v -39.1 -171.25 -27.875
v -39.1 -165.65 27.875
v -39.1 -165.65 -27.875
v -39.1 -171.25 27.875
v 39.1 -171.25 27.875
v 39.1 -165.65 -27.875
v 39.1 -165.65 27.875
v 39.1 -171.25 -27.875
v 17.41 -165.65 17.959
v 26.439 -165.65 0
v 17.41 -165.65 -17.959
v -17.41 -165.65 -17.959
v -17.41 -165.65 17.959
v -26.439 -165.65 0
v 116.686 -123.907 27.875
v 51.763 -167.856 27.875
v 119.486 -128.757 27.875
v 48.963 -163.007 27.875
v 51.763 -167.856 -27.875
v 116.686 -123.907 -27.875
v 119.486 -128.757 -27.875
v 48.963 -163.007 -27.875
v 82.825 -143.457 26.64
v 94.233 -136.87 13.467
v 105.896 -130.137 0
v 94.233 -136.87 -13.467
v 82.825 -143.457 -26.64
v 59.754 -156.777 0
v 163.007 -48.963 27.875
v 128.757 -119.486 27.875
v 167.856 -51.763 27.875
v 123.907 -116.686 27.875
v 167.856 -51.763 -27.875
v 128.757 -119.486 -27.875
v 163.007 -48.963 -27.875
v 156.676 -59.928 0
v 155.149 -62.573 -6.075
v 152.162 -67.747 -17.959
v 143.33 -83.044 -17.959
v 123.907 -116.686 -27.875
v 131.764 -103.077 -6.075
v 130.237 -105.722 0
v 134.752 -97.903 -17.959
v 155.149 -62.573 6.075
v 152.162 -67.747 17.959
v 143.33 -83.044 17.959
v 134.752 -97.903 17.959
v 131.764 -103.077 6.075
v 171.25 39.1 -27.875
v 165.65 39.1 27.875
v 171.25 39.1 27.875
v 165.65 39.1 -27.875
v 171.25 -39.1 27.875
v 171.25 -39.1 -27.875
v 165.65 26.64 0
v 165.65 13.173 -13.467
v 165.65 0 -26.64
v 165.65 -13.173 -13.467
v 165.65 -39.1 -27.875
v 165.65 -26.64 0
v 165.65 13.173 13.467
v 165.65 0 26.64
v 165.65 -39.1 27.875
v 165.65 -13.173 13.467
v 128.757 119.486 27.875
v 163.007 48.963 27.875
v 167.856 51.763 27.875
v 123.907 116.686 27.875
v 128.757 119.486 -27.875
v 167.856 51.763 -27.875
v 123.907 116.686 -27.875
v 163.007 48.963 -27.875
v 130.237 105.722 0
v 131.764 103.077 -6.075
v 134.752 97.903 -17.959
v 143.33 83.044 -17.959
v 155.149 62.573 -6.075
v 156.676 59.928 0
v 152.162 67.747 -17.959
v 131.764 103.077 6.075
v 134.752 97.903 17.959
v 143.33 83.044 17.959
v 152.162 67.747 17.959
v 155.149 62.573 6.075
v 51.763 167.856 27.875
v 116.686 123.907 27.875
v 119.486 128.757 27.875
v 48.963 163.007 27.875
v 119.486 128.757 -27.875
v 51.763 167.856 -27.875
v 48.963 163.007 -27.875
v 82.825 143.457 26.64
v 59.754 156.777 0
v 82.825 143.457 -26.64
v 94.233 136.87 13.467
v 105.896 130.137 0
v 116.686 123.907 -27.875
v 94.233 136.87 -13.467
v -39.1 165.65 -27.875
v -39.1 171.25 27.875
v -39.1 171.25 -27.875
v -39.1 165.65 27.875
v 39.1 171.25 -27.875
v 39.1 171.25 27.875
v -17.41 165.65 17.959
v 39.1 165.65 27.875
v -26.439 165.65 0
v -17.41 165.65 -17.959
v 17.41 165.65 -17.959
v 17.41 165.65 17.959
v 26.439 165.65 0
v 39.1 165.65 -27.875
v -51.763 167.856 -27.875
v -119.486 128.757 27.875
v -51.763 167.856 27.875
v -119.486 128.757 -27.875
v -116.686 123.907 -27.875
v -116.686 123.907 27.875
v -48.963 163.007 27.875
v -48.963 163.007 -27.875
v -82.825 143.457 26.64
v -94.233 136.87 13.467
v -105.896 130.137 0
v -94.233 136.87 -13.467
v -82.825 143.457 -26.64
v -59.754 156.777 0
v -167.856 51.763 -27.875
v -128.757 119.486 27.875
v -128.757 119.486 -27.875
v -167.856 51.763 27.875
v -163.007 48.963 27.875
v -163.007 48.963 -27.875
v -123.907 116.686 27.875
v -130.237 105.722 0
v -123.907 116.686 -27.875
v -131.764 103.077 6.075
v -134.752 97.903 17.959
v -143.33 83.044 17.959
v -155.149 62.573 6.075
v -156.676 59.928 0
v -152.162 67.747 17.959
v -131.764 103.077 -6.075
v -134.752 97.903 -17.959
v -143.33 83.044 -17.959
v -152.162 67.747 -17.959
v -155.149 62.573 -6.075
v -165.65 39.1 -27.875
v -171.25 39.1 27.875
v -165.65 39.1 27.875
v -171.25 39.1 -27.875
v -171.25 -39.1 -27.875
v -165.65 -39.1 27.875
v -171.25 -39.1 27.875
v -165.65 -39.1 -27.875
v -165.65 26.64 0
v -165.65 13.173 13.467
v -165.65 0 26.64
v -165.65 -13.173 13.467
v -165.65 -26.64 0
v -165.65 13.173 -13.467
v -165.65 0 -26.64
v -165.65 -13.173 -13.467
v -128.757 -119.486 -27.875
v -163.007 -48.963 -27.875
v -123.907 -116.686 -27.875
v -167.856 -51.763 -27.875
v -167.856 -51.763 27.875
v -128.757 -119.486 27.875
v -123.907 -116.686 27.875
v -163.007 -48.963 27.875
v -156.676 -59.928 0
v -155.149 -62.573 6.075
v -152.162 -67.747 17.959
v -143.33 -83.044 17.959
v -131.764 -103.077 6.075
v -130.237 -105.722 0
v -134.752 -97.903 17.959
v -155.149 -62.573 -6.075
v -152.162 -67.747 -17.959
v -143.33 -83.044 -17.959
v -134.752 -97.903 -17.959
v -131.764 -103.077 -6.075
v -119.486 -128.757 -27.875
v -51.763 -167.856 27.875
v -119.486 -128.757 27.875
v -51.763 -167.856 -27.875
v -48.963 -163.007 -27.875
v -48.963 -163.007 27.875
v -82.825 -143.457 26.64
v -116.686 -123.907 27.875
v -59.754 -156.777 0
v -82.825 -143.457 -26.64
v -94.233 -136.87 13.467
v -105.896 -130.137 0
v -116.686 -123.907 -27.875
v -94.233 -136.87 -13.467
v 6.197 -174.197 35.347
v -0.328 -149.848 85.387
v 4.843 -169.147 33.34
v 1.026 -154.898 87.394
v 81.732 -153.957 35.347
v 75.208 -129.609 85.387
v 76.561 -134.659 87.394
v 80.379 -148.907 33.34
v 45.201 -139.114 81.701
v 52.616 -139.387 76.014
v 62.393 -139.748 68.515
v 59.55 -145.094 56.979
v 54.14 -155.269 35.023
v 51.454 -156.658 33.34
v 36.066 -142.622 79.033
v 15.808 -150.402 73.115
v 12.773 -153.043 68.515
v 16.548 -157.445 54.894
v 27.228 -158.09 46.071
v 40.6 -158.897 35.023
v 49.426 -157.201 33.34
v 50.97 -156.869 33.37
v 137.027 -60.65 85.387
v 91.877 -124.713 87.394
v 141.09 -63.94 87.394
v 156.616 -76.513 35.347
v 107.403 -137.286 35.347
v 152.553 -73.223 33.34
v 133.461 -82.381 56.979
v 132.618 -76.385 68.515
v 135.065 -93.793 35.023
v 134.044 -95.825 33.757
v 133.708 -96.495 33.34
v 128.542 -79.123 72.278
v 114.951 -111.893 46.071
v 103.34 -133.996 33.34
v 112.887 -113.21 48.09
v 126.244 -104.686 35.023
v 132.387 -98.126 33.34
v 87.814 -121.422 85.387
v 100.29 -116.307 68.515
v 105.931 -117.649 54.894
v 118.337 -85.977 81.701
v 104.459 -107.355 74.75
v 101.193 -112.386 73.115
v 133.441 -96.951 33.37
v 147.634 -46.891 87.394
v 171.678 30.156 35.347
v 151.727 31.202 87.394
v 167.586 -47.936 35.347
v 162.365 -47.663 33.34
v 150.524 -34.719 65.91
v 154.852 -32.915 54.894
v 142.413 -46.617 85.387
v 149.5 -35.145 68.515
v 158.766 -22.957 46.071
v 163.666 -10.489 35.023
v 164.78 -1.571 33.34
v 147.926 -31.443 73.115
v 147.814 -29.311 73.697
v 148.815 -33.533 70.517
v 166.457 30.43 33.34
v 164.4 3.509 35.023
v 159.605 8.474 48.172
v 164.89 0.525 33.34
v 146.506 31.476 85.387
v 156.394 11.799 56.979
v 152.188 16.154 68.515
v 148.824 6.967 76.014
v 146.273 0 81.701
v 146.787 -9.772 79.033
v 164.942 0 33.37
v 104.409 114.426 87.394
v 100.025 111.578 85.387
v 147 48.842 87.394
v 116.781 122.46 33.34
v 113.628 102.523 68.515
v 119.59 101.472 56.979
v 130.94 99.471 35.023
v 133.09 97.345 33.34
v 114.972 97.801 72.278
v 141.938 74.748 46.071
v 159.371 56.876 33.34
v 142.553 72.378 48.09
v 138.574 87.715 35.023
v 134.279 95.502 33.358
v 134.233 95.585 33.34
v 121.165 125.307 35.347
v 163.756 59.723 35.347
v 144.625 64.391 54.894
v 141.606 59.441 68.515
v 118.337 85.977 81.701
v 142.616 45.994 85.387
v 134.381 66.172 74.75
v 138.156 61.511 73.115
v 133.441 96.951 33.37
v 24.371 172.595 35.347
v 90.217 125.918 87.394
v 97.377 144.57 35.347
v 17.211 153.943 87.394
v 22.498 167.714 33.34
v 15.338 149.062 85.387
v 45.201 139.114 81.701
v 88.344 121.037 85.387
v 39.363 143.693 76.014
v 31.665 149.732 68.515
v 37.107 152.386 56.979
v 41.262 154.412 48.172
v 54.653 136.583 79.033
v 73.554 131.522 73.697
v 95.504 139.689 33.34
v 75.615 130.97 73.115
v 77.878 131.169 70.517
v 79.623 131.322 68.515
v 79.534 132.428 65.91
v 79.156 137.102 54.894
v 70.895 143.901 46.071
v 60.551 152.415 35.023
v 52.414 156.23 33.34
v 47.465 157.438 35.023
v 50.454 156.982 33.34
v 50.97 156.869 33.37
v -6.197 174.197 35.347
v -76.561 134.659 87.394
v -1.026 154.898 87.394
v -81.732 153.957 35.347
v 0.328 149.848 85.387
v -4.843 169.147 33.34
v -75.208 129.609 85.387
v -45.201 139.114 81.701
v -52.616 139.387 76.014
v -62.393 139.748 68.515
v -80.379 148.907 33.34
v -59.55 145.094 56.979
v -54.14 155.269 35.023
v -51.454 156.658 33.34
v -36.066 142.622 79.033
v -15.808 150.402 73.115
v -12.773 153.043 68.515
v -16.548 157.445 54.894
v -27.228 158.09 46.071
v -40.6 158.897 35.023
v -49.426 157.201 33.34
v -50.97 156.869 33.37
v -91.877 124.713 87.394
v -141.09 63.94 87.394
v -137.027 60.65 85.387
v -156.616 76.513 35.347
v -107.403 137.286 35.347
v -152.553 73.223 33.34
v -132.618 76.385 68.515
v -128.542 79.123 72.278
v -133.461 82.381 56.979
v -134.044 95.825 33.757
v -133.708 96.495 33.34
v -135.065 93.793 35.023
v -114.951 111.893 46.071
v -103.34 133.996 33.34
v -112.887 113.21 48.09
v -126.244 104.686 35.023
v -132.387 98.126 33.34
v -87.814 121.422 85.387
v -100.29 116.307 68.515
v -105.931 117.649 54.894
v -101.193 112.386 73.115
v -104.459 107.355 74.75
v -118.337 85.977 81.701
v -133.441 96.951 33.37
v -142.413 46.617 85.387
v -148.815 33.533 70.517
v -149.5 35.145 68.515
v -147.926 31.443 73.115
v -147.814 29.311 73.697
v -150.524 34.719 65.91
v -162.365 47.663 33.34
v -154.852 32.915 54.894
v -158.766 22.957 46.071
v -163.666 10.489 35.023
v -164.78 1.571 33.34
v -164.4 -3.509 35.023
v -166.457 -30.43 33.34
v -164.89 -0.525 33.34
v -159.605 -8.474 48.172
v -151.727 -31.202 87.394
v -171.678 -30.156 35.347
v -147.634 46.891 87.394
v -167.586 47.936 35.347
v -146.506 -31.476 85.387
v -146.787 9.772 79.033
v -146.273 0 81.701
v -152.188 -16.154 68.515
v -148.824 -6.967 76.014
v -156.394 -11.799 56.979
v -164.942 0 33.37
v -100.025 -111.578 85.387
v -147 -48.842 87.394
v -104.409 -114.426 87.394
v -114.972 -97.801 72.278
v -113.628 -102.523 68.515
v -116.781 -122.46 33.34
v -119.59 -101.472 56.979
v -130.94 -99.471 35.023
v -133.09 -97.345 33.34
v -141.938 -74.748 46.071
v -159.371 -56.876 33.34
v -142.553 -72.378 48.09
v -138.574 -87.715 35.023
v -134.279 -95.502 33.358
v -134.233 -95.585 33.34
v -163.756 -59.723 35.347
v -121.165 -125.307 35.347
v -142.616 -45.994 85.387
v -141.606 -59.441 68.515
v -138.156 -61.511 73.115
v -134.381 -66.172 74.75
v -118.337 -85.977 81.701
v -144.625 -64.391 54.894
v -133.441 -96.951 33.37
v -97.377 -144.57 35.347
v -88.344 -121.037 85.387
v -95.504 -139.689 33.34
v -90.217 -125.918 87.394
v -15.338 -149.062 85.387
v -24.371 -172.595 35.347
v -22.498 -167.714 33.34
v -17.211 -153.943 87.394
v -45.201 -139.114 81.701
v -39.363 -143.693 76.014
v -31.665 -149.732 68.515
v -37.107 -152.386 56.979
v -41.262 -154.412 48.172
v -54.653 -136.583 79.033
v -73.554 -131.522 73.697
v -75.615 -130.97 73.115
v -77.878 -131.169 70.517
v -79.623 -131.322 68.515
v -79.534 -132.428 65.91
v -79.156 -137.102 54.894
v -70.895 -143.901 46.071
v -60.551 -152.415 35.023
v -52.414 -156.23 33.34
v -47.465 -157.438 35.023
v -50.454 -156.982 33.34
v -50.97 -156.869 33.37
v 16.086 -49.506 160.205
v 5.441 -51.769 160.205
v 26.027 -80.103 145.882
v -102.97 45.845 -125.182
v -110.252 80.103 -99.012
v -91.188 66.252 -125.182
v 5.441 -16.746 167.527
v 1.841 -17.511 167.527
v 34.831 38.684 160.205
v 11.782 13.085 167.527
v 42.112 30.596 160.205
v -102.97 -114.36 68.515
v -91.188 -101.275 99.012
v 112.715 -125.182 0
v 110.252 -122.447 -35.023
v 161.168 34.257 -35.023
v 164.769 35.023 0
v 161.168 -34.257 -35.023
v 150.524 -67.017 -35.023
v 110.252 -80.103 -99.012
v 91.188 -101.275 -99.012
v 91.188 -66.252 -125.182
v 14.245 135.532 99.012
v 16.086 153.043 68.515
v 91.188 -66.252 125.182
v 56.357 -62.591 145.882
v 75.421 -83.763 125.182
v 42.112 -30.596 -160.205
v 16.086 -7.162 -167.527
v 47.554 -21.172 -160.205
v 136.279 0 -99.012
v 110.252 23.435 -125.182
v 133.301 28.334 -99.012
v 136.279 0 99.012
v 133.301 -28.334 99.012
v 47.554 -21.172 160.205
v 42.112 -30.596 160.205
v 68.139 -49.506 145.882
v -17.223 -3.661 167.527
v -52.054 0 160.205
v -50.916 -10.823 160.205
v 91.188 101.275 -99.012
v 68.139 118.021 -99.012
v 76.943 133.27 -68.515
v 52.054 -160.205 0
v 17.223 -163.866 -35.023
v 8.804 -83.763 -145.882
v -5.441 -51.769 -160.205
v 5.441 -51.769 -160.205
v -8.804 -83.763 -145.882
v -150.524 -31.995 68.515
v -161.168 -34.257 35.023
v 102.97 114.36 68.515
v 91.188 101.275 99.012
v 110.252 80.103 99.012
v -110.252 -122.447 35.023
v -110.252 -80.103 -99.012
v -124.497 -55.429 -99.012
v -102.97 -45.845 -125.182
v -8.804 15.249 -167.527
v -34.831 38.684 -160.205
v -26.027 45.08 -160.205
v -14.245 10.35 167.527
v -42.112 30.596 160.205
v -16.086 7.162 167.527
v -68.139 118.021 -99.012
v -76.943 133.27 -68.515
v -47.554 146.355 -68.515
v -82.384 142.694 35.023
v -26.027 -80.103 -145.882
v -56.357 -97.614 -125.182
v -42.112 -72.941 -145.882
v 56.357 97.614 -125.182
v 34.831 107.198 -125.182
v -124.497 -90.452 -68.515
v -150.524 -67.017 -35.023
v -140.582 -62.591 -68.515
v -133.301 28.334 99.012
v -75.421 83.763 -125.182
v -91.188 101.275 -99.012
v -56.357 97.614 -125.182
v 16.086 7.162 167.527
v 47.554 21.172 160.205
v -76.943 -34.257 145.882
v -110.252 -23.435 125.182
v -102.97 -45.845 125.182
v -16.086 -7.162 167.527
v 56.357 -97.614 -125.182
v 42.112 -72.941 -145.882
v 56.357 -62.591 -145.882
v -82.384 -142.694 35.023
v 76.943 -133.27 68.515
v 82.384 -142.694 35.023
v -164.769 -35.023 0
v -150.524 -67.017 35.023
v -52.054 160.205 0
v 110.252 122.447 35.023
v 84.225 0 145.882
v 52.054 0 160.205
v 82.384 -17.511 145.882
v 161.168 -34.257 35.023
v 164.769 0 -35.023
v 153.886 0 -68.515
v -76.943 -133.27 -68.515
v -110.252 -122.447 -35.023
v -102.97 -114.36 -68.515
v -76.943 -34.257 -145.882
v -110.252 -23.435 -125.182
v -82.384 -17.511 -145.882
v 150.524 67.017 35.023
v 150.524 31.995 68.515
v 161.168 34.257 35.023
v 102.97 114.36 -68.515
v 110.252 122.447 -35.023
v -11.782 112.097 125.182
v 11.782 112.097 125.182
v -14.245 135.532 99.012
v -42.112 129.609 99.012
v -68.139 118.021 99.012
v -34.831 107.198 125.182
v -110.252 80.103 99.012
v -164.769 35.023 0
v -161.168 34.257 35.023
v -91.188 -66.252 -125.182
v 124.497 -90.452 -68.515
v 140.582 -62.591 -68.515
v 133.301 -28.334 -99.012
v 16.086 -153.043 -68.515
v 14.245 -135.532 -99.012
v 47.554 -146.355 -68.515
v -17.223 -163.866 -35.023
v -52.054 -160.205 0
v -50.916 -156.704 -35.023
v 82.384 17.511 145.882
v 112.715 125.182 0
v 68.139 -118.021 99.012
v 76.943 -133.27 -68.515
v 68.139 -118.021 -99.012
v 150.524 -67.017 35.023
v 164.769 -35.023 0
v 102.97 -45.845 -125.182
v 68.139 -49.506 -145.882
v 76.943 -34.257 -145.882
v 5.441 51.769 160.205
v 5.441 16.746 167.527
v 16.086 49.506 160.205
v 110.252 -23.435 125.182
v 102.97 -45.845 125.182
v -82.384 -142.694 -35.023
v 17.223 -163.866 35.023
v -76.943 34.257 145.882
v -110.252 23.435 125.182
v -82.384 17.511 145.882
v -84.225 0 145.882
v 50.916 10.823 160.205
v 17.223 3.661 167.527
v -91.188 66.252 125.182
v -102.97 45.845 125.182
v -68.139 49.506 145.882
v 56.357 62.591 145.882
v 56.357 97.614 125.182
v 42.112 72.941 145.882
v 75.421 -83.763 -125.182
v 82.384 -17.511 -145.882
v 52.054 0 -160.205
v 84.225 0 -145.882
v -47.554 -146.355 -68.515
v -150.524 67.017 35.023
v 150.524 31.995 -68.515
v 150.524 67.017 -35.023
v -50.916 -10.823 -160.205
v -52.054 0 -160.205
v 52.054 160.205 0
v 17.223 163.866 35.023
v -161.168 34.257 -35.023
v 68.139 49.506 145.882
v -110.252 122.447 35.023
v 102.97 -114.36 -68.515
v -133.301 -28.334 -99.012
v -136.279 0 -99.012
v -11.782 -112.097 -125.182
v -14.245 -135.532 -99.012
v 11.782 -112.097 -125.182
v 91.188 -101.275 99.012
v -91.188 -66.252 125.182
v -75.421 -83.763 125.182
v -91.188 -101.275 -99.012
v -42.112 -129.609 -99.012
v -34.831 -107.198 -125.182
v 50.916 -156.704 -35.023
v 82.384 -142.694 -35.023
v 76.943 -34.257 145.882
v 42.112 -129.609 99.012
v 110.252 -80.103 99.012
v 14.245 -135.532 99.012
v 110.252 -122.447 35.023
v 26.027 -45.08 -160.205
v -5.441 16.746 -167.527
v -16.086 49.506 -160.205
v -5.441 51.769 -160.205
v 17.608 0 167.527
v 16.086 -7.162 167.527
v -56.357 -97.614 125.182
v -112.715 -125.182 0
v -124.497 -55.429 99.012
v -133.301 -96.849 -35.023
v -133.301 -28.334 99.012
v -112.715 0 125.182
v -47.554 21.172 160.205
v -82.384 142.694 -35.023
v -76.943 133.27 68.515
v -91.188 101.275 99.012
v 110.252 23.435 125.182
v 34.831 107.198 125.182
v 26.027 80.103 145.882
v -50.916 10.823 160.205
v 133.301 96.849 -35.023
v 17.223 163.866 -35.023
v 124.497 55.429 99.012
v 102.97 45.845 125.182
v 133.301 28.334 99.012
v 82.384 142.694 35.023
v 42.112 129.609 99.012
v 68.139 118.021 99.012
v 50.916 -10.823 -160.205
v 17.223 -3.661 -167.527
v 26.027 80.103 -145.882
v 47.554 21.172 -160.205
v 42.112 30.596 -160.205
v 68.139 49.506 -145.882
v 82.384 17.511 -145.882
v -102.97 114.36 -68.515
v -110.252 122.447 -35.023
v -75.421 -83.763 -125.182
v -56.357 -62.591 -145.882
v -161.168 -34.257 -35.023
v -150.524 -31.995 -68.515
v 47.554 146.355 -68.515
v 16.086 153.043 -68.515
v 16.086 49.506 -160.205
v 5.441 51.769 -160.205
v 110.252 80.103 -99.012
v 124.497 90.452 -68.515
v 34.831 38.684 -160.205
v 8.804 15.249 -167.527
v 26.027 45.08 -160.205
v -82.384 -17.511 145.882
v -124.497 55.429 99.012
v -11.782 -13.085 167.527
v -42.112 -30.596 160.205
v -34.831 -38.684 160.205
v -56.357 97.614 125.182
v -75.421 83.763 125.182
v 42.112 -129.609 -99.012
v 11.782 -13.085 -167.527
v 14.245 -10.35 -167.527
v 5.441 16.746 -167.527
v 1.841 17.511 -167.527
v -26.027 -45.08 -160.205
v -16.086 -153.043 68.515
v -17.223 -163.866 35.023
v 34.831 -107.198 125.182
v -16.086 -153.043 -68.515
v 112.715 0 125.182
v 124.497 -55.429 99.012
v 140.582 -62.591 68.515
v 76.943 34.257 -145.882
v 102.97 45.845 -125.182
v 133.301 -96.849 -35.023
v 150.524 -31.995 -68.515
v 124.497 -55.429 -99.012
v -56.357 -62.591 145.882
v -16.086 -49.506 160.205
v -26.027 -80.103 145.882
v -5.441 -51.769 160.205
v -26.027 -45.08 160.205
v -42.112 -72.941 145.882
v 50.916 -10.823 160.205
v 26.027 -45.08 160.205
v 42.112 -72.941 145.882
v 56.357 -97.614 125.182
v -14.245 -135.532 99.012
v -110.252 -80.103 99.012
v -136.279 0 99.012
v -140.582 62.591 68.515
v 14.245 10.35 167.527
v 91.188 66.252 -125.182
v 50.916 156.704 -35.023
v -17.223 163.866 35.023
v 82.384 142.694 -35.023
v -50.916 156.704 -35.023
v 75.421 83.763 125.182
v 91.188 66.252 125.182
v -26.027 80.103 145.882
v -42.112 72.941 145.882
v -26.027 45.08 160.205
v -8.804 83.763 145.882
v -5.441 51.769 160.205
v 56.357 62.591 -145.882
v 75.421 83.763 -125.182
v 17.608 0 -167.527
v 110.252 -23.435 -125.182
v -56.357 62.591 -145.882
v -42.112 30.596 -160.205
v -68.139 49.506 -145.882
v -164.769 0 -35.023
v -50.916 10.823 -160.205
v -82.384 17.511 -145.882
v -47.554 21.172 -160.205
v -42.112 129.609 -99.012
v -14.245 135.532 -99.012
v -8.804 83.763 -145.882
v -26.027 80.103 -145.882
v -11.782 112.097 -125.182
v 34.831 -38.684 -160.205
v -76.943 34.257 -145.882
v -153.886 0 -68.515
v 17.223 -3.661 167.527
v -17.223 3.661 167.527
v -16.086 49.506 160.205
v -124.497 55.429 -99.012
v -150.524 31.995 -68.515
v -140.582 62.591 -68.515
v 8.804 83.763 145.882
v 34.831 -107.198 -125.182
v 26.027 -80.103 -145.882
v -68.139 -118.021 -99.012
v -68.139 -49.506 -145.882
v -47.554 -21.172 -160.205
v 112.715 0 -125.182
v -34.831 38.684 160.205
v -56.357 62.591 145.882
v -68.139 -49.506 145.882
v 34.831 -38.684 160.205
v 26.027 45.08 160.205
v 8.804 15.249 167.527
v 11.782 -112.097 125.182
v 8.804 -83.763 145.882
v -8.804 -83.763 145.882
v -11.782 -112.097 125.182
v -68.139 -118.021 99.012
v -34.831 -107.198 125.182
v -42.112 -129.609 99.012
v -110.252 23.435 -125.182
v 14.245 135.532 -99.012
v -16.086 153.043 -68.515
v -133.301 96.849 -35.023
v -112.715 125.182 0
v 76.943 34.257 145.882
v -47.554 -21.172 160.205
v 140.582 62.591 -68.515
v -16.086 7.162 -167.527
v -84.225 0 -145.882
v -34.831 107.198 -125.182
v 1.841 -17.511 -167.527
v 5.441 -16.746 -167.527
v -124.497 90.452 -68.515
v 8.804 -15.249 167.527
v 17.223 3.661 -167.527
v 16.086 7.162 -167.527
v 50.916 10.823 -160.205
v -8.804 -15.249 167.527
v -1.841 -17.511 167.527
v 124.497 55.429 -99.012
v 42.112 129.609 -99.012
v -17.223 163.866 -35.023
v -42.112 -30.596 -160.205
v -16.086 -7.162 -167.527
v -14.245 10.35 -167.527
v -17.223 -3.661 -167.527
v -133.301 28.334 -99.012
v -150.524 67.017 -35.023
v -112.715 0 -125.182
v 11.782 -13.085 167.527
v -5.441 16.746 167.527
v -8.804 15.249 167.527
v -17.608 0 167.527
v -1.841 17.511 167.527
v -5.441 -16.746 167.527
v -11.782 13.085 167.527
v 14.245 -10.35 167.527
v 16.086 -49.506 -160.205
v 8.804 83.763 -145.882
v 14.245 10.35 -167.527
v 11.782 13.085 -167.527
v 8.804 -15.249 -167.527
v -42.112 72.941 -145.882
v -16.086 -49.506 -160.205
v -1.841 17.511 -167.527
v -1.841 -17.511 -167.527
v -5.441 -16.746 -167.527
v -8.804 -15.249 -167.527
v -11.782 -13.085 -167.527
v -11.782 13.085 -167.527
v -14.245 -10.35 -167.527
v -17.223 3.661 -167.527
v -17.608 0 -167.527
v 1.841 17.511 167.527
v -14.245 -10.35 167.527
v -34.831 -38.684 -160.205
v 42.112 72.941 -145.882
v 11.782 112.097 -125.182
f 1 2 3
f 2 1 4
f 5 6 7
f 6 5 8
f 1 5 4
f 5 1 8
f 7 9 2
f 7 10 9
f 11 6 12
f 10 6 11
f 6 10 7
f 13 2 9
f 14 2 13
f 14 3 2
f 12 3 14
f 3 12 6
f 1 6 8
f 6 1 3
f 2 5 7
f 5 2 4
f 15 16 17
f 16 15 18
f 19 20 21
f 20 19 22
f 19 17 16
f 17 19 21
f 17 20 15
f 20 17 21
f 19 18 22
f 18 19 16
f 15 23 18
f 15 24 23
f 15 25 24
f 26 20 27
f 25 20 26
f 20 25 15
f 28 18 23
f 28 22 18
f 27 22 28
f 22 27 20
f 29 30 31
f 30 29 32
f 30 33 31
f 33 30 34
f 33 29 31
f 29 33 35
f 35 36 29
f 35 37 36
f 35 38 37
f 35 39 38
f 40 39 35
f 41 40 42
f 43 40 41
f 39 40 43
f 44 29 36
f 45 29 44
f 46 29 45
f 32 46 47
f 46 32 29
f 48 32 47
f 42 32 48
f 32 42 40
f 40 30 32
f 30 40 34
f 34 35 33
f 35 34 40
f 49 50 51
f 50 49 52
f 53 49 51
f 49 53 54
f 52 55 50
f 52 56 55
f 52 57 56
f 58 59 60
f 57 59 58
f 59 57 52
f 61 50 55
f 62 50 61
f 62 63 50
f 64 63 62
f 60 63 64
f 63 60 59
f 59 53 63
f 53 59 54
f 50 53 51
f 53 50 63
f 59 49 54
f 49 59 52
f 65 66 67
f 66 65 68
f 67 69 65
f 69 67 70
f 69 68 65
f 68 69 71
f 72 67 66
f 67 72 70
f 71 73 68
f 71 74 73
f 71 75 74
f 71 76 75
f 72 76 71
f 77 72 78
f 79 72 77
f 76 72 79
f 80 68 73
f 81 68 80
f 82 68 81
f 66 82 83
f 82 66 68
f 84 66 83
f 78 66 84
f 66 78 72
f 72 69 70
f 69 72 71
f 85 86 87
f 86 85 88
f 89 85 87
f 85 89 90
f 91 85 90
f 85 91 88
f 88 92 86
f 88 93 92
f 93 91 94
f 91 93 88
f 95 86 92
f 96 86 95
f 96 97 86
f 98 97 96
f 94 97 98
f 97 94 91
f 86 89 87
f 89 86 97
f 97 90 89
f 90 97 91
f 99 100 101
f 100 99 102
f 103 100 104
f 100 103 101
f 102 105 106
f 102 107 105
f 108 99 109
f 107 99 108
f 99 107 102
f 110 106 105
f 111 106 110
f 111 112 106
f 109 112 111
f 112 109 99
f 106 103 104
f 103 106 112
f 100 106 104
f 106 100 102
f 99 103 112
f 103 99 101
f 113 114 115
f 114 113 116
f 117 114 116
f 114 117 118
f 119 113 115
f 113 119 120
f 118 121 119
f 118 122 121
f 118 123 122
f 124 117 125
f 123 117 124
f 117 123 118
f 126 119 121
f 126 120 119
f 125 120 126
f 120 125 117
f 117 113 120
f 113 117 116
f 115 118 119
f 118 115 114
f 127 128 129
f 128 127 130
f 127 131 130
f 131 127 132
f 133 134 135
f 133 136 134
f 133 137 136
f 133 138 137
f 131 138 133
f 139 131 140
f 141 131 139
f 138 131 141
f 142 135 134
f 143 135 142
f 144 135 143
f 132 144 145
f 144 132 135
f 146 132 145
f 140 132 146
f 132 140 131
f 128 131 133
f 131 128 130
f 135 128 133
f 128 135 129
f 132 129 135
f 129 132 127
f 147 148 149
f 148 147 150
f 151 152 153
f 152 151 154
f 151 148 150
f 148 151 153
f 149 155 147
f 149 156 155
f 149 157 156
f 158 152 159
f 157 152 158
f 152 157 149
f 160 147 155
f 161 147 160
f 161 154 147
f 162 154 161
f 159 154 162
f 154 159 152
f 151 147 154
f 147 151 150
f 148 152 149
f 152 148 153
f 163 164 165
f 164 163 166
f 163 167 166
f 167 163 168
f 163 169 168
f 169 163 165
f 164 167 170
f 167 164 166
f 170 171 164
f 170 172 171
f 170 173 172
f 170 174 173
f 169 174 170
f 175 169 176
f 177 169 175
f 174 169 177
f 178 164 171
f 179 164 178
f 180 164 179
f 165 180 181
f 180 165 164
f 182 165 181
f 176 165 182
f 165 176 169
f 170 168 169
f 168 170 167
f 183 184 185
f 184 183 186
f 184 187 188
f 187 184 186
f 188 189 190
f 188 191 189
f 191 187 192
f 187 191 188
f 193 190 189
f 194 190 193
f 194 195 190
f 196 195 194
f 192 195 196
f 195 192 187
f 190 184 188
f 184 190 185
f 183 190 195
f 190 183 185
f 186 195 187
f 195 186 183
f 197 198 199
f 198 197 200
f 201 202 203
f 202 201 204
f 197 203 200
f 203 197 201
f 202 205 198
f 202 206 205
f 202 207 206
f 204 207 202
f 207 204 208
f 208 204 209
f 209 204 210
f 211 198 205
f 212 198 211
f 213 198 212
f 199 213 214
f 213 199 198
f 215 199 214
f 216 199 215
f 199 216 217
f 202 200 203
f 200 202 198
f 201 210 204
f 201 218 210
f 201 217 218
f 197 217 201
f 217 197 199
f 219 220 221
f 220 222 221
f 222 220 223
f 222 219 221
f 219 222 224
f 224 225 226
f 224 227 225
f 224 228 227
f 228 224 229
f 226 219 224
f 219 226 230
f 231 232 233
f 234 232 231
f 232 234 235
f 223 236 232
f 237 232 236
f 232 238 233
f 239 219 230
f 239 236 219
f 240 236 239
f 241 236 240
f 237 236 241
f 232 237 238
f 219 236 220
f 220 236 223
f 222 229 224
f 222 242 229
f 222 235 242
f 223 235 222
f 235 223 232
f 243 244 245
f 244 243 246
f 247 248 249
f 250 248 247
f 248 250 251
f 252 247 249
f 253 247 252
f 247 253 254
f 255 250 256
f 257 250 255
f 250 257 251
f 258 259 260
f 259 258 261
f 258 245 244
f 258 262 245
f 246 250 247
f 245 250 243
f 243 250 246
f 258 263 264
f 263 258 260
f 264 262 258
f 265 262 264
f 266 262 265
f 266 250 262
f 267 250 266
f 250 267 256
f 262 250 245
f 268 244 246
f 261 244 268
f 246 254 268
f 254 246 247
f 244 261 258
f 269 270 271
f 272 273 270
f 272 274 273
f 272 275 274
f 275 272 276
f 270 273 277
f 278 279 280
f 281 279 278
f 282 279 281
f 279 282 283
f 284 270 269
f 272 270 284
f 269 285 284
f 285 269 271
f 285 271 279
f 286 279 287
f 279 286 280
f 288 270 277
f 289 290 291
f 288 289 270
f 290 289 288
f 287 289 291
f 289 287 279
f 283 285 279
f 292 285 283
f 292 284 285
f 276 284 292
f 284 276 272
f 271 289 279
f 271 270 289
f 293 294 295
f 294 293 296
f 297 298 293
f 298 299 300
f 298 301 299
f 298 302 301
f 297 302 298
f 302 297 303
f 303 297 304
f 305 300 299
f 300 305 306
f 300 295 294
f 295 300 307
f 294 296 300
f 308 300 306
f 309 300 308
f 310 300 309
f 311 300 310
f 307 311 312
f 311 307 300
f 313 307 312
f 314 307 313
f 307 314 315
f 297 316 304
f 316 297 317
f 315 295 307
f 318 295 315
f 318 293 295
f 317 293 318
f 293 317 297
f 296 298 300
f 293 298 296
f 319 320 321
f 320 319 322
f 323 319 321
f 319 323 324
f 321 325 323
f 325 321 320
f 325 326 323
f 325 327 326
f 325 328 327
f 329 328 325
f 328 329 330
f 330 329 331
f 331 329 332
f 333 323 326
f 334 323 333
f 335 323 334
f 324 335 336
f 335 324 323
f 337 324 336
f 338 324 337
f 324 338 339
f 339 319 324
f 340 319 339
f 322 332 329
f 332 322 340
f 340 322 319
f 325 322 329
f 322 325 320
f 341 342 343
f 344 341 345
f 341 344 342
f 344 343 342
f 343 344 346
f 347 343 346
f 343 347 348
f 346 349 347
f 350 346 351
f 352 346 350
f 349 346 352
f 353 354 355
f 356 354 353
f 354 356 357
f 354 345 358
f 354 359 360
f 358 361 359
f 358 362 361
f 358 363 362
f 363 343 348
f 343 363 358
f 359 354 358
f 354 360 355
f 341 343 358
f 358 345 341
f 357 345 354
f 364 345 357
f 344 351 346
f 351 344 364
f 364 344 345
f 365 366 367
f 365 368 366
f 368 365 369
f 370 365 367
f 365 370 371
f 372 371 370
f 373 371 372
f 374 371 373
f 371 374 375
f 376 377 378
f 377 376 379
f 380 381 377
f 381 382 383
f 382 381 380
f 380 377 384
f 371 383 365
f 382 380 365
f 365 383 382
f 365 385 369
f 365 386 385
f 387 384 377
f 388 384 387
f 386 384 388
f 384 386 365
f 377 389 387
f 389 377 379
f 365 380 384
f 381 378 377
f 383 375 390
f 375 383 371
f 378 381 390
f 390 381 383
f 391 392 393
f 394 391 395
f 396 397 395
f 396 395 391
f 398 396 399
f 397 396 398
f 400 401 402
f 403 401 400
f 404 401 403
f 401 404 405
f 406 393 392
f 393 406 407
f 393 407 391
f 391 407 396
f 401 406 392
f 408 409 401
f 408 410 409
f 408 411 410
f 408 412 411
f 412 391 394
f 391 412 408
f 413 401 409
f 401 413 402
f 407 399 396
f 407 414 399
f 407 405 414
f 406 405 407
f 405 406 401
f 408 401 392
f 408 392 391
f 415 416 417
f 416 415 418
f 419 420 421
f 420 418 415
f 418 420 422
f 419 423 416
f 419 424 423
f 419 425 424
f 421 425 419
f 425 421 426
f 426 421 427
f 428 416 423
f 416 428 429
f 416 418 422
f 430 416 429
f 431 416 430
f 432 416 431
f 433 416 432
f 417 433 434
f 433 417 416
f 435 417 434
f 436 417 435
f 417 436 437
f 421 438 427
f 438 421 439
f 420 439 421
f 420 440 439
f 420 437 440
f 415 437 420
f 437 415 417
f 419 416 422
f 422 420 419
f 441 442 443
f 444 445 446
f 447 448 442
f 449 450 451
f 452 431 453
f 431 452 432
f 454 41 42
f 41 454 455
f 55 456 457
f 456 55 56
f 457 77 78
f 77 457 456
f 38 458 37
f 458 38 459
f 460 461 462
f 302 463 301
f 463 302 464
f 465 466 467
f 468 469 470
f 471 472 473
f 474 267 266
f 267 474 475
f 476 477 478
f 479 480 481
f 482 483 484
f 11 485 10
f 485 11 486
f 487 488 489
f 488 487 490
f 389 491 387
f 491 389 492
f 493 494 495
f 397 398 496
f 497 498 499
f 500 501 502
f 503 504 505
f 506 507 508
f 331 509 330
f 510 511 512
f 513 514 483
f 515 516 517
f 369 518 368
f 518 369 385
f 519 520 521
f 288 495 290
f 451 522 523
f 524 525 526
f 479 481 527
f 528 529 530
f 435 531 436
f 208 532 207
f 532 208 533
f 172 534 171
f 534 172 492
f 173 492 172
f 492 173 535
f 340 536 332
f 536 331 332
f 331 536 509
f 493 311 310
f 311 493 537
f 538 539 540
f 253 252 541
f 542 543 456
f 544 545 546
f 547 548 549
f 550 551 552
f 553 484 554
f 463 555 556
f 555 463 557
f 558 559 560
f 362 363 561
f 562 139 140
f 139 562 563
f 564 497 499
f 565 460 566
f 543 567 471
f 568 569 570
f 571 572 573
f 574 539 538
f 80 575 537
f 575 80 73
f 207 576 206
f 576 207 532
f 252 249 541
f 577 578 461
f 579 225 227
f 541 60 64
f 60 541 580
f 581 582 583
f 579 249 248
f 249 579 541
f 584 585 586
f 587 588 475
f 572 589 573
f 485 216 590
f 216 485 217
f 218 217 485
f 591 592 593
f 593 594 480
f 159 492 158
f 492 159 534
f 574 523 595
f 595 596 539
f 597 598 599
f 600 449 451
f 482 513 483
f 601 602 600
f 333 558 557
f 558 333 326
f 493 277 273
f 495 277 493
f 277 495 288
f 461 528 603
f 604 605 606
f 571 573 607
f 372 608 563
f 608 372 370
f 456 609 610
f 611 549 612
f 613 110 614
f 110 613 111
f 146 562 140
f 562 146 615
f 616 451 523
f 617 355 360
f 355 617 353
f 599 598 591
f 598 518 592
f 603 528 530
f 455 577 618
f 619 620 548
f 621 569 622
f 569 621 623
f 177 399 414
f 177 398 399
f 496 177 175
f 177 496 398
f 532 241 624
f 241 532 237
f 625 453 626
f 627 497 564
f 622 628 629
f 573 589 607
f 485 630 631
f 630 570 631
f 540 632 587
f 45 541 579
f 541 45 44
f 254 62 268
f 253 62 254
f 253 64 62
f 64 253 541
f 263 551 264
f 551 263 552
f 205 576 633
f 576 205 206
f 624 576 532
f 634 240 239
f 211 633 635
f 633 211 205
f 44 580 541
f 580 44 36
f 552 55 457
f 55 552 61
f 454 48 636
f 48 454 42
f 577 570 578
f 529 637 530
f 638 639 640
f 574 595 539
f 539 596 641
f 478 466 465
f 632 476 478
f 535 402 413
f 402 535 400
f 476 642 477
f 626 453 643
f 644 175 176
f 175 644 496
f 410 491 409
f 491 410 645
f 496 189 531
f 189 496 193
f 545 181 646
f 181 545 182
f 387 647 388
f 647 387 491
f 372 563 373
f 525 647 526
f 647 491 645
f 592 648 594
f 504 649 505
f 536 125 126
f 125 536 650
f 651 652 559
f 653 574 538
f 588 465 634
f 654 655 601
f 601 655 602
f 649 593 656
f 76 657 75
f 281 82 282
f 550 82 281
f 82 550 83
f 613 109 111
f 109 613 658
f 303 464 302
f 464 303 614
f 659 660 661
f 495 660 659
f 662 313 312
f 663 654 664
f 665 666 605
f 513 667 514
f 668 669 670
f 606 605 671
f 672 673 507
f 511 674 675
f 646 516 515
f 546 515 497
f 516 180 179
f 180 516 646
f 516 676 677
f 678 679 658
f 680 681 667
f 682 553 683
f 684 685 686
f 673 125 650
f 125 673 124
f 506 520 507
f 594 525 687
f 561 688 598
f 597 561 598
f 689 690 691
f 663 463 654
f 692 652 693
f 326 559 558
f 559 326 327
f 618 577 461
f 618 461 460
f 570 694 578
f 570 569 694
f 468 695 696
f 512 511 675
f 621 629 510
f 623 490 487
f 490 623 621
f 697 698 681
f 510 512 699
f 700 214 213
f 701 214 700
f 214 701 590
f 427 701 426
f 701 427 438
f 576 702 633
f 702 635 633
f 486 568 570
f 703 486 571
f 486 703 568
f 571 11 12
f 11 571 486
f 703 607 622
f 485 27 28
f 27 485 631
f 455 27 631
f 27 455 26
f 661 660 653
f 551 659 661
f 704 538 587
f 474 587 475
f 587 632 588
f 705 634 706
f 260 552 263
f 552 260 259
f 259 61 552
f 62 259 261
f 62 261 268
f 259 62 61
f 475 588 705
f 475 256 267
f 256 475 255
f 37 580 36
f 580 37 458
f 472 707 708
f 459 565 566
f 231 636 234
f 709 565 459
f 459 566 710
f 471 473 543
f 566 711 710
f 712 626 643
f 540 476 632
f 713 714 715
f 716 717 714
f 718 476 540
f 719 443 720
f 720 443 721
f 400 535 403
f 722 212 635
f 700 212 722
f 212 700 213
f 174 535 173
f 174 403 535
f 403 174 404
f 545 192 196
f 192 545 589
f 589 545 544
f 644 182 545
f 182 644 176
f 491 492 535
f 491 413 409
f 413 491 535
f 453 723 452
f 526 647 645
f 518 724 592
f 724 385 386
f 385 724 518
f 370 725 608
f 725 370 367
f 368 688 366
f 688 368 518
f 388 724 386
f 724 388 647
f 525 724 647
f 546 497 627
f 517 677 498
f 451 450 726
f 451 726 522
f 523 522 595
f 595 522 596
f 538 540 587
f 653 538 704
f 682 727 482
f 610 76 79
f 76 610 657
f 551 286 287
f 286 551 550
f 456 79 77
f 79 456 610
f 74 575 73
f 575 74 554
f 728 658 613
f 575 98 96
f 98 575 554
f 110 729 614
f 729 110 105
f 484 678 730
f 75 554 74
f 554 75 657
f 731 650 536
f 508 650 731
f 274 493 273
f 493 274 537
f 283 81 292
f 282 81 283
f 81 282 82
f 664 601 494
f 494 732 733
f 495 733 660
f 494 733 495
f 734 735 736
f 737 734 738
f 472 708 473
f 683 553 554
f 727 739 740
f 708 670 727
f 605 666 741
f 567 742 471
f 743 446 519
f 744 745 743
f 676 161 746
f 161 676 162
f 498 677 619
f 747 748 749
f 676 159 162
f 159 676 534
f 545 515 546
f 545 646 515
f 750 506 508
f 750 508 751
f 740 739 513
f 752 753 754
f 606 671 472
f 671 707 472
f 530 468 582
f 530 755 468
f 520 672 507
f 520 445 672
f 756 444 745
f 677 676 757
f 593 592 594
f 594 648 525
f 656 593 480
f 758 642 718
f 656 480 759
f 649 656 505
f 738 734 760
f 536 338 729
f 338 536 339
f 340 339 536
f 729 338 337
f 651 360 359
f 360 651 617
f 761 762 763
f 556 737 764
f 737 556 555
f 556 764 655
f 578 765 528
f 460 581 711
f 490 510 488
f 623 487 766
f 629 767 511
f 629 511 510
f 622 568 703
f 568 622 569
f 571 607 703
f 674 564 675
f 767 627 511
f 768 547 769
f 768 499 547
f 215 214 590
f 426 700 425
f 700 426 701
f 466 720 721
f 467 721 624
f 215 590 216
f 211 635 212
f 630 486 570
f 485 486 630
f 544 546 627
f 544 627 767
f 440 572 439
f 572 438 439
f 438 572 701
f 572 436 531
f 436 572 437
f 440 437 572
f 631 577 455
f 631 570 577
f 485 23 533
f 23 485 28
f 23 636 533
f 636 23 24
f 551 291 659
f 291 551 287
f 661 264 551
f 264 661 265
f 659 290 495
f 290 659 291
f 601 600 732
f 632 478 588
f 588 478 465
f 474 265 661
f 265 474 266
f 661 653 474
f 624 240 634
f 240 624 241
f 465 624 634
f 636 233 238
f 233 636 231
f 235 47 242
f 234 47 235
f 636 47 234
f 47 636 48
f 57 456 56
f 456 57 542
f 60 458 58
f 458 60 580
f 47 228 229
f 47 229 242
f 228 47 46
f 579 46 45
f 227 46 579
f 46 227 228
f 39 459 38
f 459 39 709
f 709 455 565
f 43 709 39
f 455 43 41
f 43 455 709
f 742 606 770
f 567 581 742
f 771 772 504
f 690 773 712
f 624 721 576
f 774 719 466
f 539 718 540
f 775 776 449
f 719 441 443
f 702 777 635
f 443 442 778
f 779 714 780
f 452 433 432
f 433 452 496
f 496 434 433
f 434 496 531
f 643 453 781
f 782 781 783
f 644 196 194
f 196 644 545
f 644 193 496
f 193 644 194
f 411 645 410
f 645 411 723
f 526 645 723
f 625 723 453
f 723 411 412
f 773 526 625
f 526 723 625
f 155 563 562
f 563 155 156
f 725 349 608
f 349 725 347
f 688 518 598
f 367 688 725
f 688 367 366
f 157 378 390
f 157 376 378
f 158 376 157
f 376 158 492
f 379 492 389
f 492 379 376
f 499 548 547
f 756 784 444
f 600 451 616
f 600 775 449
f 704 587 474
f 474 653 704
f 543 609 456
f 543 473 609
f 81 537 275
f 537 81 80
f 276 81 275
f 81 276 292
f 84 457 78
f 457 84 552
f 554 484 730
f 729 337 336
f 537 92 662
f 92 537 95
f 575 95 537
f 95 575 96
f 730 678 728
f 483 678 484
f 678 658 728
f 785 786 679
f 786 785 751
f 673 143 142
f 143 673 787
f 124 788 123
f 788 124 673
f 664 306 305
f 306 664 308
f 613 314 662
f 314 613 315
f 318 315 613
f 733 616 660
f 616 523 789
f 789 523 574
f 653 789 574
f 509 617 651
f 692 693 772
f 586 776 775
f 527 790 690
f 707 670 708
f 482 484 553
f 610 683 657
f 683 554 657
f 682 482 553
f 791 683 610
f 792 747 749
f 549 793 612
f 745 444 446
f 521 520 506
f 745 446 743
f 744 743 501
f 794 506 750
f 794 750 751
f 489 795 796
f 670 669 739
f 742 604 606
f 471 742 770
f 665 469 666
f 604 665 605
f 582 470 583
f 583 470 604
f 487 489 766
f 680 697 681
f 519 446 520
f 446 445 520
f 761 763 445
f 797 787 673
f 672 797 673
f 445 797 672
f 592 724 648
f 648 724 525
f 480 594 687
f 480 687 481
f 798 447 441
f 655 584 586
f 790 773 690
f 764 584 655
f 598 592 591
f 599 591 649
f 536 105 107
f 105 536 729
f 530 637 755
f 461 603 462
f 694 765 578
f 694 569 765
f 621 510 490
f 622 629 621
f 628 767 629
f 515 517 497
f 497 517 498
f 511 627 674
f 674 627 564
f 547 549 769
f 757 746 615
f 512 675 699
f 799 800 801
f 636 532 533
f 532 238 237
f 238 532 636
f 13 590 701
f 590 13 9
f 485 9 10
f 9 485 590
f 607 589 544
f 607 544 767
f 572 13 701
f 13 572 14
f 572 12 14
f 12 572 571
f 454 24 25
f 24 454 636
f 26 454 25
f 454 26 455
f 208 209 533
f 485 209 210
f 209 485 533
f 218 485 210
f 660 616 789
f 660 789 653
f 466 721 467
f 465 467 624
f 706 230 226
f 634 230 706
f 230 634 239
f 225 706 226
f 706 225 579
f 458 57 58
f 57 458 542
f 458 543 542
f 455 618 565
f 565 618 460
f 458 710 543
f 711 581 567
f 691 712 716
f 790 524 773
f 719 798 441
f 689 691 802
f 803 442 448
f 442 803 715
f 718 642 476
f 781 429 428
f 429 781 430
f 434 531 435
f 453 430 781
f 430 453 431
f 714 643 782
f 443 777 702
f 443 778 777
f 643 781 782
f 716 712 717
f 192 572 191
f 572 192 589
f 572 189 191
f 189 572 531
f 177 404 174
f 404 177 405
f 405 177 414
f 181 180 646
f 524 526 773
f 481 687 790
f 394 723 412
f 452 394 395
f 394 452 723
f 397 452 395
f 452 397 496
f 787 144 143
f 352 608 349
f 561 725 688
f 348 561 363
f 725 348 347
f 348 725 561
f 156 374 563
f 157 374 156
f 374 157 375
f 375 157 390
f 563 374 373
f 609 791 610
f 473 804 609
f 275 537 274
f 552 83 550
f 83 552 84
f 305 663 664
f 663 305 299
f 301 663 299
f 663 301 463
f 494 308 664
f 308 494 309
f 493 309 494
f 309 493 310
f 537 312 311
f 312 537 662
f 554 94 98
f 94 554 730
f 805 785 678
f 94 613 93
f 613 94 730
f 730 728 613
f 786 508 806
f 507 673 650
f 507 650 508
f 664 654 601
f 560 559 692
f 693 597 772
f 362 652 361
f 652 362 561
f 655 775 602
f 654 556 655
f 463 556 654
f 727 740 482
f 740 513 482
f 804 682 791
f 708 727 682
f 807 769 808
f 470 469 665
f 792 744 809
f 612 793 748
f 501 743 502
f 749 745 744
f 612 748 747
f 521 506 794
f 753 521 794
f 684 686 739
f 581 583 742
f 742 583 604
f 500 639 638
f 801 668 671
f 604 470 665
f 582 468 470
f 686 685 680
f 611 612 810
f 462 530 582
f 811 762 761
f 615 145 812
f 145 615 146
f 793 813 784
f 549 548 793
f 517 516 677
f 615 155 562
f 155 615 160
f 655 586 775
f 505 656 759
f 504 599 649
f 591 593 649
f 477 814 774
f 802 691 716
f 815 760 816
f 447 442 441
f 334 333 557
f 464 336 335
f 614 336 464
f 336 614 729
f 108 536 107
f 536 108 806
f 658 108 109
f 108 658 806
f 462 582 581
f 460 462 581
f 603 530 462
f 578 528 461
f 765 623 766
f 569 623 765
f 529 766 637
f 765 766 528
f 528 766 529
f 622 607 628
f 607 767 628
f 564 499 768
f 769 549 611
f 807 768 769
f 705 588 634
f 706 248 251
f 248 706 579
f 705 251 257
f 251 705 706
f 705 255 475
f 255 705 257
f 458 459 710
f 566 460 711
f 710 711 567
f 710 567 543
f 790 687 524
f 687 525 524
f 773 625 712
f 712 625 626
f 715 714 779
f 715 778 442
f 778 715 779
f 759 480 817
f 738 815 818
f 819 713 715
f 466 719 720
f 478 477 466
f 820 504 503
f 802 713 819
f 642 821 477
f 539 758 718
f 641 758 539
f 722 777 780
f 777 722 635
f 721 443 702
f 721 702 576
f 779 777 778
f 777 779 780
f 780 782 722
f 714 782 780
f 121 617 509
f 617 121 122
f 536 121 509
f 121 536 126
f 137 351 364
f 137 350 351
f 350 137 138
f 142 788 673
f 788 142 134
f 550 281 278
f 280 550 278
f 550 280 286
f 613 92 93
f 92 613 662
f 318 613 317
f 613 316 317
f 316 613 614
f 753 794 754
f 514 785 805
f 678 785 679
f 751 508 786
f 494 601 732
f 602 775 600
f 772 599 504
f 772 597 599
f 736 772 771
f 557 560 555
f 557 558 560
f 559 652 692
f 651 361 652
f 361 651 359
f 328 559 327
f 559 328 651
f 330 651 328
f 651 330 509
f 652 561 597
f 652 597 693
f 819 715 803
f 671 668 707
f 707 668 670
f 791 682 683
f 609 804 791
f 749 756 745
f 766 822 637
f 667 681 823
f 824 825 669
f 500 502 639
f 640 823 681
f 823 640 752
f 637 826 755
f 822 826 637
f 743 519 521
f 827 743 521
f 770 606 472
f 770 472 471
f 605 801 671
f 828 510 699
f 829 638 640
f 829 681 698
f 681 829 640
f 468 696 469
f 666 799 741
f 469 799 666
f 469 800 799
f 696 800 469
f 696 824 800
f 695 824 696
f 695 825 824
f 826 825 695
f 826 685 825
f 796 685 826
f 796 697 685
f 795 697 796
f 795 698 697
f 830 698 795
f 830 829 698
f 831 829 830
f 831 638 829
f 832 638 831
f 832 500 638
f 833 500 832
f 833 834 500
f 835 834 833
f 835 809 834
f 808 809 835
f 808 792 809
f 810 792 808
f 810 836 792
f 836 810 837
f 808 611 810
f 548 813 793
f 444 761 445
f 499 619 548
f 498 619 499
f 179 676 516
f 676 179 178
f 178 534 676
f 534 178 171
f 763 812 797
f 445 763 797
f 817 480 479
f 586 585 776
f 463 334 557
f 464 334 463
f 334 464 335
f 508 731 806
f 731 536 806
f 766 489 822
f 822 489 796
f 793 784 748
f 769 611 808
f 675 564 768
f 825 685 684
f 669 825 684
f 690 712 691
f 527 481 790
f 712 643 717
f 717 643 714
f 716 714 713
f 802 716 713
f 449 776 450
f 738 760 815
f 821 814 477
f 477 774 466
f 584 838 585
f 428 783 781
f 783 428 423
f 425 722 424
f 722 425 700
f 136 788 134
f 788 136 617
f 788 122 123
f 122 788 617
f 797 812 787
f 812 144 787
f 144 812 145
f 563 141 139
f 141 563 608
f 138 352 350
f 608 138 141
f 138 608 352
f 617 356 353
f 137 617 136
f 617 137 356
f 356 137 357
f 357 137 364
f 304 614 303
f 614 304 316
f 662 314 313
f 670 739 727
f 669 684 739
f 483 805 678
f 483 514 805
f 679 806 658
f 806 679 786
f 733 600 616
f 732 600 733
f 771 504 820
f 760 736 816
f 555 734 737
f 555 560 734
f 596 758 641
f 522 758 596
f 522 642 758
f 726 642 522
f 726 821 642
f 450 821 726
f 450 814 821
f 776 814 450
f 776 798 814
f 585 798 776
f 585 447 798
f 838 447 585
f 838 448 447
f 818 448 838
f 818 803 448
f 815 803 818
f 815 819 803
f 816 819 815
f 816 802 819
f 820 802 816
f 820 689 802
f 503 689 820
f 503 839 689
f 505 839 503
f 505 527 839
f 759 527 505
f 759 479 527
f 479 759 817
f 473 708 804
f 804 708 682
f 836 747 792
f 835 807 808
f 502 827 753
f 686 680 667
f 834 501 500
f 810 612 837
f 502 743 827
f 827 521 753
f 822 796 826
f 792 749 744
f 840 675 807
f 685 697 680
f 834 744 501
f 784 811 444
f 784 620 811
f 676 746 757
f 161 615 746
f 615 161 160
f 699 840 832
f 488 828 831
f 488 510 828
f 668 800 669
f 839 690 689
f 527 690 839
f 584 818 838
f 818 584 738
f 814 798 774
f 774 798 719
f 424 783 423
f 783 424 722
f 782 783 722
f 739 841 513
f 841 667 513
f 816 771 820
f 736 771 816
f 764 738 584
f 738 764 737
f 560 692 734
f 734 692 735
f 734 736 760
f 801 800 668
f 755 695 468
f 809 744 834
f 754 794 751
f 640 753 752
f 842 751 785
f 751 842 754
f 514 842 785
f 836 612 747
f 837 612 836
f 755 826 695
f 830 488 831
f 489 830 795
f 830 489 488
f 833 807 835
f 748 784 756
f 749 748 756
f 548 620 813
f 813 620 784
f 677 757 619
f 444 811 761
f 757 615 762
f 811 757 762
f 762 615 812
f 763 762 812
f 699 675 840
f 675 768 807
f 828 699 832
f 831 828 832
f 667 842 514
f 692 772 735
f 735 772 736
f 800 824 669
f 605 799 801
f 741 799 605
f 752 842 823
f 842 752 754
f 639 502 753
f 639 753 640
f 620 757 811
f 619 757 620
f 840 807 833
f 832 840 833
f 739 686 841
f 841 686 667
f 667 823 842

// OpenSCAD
screenX = 78.2;
screenY = 55.75;
screenZ = 3.6;

ballD = (screenX + 10) * 12 / 3.141592653;

module screen() {
	cube([screenX, screenY, screenZ + 2], center=true);
}

union() {
	#sphere(d=ballD, center=true);
	for (z = [0:11]) {
		rotate([90,0,30*z]) translate([0,0,ballD/2]) screen();
	}

	rotate([0,0,15])
	for (z = [0:9]) {
		rotate([69,0,36*z]) translate([0,0,ballD/2]) screen();
	}
/*
	for (z = [0:7]) {
		rotate([55,0,30*z]) translate([0,0,ballD/2]) screen();
	}

	for (z = [0:5]) {
		rotate([38,0,40*z]) translate([0,0,ballD/2]) screen();
	}

	for (z = [0:3]) {
		rotate([22,0,72*z]) translate([0,0,ballD/2]) screen();
	}
*/
}
